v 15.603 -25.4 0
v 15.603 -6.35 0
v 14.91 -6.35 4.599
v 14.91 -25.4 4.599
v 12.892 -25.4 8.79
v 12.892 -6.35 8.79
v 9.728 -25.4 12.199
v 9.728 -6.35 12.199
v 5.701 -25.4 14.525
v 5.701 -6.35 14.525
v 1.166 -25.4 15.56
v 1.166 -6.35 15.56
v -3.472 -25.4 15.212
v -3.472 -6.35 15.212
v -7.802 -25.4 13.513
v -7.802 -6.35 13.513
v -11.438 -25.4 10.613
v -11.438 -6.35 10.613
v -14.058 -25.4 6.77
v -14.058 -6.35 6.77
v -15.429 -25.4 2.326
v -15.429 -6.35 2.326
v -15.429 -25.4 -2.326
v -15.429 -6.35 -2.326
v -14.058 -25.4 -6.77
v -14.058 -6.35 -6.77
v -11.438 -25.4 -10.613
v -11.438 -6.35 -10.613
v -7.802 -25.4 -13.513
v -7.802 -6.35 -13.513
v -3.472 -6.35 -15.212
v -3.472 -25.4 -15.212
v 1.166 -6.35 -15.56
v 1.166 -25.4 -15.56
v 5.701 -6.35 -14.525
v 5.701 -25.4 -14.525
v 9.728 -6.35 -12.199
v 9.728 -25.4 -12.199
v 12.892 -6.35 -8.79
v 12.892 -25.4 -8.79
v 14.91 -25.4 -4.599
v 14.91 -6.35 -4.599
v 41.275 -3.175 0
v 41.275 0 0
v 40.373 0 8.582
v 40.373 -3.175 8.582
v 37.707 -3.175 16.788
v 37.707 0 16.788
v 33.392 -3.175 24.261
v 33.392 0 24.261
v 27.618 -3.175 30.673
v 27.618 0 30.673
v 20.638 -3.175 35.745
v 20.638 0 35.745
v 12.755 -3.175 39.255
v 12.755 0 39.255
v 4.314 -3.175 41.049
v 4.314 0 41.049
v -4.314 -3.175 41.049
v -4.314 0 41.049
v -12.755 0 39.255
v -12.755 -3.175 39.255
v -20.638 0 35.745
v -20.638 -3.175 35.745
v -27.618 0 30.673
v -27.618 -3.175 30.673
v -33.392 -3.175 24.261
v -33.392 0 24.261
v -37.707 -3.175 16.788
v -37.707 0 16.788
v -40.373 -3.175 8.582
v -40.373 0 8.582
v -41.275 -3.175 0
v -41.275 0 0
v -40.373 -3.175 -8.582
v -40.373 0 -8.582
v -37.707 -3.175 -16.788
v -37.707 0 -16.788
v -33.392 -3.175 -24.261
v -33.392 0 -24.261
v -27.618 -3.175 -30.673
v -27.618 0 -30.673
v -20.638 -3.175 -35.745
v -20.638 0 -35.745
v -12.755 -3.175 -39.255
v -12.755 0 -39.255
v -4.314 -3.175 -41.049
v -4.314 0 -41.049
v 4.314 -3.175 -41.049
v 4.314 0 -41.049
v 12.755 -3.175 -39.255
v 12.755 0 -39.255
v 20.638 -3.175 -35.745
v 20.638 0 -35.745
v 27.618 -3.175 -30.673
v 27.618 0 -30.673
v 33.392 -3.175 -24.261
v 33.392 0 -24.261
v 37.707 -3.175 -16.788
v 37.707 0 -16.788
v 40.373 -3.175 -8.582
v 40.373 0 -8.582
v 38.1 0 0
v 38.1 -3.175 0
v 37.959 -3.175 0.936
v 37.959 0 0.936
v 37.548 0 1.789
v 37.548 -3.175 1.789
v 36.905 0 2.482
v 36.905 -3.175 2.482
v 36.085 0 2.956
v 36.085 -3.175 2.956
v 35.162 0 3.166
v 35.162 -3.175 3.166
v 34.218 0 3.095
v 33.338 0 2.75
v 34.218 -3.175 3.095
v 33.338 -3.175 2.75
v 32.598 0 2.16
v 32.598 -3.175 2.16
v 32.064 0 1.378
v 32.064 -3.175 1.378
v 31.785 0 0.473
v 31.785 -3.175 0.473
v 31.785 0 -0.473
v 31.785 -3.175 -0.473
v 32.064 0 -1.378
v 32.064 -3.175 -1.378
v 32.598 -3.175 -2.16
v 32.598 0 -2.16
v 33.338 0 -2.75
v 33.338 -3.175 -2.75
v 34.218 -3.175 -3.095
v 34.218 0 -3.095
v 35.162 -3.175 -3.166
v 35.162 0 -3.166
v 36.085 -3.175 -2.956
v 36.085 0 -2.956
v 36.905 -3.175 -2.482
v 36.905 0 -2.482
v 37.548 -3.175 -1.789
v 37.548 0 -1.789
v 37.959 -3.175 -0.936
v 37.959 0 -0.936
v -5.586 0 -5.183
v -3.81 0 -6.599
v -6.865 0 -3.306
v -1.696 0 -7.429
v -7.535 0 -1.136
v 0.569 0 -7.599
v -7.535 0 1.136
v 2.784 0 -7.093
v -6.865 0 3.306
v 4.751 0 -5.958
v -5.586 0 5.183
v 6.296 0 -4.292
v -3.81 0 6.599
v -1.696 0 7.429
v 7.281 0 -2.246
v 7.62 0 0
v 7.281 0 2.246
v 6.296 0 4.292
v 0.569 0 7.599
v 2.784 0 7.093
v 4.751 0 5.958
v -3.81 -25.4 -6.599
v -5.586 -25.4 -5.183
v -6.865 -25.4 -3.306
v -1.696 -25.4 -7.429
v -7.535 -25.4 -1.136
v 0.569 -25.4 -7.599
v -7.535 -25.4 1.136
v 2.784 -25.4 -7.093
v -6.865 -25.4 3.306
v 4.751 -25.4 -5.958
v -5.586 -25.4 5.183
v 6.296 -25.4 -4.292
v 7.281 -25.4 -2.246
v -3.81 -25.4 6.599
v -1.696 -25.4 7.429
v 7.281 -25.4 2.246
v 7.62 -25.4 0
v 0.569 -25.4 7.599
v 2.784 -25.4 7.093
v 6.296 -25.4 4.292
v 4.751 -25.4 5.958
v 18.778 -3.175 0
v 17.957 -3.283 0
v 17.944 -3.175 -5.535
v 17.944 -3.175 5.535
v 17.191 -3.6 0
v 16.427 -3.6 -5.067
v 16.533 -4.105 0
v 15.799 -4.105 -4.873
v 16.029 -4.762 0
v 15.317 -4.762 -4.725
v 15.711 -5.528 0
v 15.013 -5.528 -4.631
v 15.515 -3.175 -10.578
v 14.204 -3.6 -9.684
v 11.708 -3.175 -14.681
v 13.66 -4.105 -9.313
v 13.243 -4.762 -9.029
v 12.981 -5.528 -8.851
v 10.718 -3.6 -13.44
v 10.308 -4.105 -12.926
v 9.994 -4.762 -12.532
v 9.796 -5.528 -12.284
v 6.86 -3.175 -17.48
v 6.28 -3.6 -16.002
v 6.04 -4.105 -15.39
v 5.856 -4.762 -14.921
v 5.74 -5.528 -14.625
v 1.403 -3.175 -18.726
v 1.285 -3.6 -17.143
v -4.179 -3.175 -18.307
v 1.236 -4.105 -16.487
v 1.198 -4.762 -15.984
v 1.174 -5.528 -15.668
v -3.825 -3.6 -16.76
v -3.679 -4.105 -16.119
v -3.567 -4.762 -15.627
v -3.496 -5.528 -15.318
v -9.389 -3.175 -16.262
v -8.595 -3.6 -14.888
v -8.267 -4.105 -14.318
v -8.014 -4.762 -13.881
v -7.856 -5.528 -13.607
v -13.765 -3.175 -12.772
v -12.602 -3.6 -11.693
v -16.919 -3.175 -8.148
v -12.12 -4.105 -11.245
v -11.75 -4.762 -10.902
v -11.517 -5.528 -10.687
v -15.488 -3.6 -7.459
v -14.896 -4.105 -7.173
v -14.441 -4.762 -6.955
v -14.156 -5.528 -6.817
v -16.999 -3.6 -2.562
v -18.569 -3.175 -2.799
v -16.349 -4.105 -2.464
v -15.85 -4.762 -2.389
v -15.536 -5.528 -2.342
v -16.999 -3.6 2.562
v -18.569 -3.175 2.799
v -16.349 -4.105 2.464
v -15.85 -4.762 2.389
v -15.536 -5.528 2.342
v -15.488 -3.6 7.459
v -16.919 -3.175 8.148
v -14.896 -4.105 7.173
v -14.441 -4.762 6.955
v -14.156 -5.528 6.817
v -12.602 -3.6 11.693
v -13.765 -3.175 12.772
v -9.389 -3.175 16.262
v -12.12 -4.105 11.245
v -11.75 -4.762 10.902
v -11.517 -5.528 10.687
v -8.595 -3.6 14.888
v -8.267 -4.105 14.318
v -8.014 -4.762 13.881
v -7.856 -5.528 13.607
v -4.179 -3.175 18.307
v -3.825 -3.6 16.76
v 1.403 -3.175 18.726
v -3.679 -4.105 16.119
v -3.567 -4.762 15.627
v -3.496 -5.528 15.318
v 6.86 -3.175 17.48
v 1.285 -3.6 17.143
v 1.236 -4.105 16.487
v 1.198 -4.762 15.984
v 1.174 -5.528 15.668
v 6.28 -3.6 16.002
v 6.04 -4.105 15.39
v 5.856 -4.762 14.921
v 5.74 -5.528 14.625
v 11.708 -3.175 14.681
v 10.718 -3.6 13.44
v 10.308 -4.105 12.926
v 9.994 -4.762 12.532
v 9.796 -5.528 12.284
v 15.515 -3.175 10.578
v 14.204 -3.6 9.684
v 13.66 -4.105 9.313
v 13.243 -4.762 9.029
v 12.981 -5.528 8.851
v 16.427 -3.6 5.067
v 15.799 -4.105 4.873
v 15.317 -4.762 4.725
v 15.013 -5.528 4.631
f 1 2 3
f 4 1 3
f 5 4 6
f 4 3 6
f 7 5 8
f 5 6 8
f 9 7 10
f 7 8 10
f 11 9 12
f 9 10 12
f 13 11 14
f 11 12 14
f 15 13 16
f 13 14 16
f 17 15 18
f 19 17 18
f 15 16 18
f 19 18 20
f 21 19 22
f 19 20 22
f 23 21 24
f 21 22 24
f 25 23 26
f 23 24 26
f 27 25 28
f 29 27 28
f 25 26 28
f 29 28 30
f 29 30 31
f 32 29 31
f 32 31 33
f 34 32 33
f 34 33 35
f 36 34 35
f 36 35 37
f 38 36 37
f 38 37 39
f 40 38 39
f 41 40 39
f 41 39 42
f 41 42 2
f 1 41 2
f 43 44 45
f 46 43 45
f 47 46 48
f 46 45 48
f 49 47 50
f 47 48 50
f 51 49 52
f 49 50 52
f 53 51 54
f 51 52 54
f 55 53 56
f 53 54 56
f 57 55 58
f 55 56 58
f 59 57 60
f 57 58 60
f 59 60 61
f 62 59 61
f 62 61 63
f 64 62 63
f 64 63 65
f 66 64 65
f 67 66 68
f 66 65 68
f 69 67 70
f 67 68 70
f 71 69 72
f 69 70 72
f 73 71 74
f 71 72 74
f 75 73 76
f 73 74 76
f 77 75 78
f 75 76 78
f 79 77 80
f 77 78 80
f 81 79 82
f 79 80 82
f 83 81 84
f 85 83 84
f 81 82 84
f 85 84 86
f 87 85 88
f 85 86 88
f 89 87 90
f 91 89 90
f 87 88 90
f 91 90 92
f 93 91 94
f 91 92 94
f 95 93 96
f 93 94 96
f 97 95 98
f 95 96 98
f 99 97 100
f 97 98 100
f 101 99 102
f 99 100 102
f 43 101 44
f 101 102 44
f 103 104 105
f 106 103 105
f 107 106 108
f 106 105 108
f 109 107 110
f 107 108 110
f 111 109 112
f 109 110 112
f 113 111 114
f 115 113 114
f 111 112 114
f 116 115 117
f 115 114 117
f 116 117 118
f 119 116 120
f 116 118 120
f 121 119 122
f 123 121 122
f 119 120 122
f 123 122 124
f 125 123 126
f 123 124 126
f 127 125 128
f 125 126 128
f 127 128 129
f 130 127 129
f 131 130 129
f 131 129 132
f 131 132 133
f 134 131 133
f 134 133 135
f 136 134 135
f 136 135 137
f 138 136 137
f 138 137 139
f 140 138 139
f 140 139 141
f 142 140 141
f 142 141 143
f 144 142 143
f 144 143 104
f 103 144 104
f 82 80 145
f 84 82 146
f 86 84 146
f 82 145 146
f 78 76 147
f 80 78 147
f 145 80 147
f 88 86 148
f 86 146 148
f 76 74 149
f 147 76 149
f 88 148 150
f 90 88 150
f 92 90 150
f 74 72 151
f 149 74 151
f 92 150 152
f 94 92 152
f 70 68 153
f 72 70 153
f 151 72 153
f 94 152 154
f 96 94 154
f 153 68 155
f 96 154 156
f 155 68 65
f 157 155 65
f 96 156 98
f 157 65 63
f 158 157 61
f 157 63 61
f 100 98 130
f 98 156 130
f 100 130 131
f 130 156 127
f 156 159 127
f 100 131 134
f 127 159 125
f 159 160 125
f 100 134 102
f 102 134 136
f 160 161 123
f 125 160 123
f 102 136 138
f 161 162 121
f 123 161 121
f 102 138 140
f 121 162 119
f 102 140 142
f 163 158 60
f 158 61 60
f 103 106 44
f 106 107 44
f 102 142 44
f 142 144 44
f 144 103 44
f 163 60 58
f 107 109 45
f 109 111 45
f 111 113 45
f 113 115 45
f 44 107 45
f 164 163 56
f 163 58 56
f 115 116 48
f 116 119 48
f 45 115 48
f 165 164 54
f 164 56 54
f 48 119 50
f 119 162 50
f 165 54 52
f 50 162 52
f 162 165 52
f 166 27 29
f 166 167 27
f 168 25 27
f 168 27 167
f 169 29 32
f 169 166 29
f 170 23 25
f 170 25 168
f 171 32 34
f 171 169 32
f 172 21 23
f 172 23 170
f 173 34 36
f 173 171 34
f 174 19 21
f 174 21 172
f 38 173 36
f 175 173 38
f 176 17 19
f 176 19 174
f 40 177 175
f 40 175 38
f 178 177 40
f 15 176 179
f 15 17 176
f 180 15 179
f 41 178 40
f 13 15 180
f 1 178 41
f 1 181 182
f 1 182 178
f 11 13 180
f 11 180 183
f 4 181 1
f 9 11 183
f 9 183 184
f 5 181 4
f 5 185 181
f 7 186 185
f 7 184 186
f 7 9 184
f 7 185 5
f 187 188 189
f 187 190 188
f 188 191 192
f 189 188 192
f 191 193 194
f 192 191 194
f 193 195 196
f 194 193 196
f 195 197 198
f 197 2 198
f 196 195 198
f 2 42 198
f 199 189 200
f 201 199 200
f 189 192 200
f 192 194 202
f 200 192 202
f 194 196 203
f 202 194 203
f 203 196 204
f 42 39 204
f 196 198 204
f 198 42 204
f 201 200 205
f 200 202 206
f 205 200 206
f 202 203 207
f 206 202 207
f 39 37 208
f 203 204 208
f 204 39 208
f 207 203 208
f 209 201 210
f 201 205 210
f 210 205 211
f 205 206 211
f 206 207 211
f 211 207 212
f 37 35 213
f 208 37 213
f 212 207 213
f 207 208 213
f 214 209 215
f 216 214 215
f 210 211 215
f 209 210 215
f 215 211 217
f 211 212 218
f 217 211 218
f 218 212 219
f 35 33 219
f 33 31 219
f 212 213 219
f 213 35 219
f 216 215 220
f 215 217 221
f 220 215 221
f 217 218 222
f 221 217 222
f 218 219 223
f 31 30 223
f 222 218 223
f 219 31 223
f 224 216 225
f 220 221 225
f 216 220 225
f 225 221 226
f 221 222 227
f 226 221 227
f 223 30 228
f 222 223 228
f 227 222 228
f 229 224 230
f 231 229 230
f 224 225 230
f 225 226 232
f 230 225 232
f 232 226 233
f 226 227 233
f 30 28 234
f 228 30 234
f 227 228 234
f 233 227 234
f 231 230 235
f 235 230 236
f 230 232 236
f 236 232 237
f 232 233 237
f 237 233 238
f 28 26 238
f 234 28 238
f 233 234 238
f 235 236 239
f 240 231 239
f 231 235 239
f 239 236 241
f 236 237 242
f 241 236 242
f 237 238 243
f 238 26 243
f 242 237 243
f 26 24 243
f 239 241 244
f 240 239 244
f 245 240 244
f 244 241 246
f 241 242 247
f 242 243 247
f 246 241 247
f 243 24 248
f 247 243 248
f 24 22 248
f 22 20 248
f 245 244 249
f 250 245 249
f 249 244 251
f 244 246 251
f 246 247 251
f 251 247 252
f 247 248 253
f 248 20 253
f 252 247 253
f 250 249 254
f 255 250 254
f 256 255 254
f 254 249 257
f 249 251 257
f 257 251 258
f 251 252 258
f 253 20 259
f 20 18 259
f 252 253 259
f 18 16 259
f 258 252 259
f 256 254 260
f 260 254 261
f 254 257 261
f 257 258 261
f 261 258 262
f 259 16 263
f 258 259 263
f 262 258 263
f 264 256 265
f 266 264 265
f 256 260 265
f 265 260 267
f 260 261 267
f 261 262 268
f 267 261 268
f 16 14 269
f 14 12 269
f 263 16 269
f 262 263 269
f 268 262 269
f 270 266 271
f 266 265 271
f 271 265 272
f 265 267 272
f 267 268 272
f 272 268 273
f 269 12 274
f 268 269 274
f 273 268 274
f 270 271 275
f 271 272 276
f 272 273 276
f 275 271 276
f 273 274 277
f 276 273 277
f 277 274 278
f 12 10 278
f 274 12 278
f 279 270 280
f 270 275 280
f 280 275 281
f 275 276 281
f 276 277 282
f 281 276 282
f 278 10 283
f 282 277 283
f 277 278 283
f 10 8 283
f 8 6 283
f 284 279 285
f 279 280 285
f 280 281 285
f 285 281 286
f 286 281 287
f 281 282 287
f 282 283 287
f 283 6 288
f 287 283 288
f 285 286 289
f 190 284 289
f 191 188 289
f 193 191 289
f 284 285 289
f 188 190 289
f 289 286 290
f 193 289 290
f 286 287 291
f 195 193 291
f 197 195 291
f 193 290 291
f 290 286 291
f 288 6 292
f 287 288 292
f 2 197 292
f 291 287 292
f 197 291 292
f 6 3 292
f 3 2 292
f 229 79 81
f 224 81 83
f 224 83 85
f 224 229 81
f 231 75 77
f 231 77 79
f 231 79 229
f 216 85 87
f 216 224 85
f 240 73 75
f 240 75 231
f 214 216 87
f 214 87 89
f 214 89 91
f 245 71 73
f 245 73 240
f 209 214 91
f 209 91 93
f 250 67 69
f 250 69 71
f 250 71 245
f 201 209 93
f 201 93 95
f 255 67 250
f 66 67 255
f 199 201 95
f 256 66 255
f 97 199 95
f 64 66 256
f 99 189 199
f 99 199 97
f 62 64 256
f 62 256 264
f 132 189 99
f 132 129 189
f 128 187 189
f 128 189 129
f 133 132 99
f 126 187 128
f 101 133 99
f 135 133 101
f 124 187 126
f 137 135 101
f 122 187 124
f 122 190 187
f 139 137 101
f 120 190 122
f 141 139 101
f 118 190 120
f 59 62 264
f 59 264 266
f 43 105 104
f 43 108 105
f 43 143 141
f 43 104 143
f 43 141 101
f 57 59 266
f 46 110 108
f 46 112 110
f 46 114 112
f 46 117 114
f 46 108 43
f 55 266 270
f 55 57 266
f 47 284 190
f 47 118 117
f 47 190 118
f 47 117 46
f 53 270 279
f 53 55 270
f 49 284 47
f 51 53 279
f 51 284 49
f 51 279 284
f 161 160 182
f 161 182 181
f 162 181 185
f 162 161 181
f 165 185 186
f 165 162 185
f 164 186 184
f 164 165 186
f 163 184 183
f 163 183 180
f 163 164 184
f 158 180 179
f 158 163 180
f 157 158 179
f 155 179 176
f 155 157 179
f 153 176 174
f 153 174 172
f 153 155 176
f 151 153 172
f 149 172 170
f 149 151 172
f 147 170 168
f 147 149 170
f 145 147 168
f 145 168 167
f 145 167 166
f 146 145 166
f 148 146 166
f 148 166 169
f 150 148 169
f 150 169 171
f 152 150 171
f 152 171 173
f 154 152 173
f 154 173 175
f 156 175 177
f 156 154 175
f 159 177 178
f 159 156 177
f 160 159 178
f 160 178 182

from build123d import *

# Parameters (mm, degrees)
F0_R     = 41.275
F1_DEPTH = 3.175
F2_R     = 15.603275
F3_DEPTH = 25.4
F4_R     = 7.62
F5_DEPTH = 25.4
F6_R     = 3.175
F8_R     = 3.175
F9_DEPTH = 25.4


with BuildPart() as f1:
    # F0 (on Front) → F1 (new body)
    with BuildSketch(Plane.XZ):
        Circle(F0_R)
    extrude(amount=F1_DEPTH)

    # F2 (on Front) → F3 (join)
    with BuildSketch(Plane.XZ):
        Circle(F2_R)
    extrude(amount=F3_DEPTH)

    # F4 (on Front) → F5 (cut)
    with BuildSketch(Plane.XZ):
        Circle(F4_R)
    extrude(amount=F5_DEPTH, mode=Mode.SUBTRACT)

    # F6
    f6_edges = [f1.edges().sort_by_distance(p)[0] for p in [
        (-15.603275, -3.175, 0),
    ]]
    fillet(f6_edges, radius=F6_R)

    # F8 (on face) → F9 (cut)
    with BuildSketch(Plane.XZ.offset(3.175)):
        with Locations((34.925, 0)):
            Circle(F8_R)
    extrude(amount=-F9_DEPTH, mode=Mode.SUBTRACT)


solid = f1.part
